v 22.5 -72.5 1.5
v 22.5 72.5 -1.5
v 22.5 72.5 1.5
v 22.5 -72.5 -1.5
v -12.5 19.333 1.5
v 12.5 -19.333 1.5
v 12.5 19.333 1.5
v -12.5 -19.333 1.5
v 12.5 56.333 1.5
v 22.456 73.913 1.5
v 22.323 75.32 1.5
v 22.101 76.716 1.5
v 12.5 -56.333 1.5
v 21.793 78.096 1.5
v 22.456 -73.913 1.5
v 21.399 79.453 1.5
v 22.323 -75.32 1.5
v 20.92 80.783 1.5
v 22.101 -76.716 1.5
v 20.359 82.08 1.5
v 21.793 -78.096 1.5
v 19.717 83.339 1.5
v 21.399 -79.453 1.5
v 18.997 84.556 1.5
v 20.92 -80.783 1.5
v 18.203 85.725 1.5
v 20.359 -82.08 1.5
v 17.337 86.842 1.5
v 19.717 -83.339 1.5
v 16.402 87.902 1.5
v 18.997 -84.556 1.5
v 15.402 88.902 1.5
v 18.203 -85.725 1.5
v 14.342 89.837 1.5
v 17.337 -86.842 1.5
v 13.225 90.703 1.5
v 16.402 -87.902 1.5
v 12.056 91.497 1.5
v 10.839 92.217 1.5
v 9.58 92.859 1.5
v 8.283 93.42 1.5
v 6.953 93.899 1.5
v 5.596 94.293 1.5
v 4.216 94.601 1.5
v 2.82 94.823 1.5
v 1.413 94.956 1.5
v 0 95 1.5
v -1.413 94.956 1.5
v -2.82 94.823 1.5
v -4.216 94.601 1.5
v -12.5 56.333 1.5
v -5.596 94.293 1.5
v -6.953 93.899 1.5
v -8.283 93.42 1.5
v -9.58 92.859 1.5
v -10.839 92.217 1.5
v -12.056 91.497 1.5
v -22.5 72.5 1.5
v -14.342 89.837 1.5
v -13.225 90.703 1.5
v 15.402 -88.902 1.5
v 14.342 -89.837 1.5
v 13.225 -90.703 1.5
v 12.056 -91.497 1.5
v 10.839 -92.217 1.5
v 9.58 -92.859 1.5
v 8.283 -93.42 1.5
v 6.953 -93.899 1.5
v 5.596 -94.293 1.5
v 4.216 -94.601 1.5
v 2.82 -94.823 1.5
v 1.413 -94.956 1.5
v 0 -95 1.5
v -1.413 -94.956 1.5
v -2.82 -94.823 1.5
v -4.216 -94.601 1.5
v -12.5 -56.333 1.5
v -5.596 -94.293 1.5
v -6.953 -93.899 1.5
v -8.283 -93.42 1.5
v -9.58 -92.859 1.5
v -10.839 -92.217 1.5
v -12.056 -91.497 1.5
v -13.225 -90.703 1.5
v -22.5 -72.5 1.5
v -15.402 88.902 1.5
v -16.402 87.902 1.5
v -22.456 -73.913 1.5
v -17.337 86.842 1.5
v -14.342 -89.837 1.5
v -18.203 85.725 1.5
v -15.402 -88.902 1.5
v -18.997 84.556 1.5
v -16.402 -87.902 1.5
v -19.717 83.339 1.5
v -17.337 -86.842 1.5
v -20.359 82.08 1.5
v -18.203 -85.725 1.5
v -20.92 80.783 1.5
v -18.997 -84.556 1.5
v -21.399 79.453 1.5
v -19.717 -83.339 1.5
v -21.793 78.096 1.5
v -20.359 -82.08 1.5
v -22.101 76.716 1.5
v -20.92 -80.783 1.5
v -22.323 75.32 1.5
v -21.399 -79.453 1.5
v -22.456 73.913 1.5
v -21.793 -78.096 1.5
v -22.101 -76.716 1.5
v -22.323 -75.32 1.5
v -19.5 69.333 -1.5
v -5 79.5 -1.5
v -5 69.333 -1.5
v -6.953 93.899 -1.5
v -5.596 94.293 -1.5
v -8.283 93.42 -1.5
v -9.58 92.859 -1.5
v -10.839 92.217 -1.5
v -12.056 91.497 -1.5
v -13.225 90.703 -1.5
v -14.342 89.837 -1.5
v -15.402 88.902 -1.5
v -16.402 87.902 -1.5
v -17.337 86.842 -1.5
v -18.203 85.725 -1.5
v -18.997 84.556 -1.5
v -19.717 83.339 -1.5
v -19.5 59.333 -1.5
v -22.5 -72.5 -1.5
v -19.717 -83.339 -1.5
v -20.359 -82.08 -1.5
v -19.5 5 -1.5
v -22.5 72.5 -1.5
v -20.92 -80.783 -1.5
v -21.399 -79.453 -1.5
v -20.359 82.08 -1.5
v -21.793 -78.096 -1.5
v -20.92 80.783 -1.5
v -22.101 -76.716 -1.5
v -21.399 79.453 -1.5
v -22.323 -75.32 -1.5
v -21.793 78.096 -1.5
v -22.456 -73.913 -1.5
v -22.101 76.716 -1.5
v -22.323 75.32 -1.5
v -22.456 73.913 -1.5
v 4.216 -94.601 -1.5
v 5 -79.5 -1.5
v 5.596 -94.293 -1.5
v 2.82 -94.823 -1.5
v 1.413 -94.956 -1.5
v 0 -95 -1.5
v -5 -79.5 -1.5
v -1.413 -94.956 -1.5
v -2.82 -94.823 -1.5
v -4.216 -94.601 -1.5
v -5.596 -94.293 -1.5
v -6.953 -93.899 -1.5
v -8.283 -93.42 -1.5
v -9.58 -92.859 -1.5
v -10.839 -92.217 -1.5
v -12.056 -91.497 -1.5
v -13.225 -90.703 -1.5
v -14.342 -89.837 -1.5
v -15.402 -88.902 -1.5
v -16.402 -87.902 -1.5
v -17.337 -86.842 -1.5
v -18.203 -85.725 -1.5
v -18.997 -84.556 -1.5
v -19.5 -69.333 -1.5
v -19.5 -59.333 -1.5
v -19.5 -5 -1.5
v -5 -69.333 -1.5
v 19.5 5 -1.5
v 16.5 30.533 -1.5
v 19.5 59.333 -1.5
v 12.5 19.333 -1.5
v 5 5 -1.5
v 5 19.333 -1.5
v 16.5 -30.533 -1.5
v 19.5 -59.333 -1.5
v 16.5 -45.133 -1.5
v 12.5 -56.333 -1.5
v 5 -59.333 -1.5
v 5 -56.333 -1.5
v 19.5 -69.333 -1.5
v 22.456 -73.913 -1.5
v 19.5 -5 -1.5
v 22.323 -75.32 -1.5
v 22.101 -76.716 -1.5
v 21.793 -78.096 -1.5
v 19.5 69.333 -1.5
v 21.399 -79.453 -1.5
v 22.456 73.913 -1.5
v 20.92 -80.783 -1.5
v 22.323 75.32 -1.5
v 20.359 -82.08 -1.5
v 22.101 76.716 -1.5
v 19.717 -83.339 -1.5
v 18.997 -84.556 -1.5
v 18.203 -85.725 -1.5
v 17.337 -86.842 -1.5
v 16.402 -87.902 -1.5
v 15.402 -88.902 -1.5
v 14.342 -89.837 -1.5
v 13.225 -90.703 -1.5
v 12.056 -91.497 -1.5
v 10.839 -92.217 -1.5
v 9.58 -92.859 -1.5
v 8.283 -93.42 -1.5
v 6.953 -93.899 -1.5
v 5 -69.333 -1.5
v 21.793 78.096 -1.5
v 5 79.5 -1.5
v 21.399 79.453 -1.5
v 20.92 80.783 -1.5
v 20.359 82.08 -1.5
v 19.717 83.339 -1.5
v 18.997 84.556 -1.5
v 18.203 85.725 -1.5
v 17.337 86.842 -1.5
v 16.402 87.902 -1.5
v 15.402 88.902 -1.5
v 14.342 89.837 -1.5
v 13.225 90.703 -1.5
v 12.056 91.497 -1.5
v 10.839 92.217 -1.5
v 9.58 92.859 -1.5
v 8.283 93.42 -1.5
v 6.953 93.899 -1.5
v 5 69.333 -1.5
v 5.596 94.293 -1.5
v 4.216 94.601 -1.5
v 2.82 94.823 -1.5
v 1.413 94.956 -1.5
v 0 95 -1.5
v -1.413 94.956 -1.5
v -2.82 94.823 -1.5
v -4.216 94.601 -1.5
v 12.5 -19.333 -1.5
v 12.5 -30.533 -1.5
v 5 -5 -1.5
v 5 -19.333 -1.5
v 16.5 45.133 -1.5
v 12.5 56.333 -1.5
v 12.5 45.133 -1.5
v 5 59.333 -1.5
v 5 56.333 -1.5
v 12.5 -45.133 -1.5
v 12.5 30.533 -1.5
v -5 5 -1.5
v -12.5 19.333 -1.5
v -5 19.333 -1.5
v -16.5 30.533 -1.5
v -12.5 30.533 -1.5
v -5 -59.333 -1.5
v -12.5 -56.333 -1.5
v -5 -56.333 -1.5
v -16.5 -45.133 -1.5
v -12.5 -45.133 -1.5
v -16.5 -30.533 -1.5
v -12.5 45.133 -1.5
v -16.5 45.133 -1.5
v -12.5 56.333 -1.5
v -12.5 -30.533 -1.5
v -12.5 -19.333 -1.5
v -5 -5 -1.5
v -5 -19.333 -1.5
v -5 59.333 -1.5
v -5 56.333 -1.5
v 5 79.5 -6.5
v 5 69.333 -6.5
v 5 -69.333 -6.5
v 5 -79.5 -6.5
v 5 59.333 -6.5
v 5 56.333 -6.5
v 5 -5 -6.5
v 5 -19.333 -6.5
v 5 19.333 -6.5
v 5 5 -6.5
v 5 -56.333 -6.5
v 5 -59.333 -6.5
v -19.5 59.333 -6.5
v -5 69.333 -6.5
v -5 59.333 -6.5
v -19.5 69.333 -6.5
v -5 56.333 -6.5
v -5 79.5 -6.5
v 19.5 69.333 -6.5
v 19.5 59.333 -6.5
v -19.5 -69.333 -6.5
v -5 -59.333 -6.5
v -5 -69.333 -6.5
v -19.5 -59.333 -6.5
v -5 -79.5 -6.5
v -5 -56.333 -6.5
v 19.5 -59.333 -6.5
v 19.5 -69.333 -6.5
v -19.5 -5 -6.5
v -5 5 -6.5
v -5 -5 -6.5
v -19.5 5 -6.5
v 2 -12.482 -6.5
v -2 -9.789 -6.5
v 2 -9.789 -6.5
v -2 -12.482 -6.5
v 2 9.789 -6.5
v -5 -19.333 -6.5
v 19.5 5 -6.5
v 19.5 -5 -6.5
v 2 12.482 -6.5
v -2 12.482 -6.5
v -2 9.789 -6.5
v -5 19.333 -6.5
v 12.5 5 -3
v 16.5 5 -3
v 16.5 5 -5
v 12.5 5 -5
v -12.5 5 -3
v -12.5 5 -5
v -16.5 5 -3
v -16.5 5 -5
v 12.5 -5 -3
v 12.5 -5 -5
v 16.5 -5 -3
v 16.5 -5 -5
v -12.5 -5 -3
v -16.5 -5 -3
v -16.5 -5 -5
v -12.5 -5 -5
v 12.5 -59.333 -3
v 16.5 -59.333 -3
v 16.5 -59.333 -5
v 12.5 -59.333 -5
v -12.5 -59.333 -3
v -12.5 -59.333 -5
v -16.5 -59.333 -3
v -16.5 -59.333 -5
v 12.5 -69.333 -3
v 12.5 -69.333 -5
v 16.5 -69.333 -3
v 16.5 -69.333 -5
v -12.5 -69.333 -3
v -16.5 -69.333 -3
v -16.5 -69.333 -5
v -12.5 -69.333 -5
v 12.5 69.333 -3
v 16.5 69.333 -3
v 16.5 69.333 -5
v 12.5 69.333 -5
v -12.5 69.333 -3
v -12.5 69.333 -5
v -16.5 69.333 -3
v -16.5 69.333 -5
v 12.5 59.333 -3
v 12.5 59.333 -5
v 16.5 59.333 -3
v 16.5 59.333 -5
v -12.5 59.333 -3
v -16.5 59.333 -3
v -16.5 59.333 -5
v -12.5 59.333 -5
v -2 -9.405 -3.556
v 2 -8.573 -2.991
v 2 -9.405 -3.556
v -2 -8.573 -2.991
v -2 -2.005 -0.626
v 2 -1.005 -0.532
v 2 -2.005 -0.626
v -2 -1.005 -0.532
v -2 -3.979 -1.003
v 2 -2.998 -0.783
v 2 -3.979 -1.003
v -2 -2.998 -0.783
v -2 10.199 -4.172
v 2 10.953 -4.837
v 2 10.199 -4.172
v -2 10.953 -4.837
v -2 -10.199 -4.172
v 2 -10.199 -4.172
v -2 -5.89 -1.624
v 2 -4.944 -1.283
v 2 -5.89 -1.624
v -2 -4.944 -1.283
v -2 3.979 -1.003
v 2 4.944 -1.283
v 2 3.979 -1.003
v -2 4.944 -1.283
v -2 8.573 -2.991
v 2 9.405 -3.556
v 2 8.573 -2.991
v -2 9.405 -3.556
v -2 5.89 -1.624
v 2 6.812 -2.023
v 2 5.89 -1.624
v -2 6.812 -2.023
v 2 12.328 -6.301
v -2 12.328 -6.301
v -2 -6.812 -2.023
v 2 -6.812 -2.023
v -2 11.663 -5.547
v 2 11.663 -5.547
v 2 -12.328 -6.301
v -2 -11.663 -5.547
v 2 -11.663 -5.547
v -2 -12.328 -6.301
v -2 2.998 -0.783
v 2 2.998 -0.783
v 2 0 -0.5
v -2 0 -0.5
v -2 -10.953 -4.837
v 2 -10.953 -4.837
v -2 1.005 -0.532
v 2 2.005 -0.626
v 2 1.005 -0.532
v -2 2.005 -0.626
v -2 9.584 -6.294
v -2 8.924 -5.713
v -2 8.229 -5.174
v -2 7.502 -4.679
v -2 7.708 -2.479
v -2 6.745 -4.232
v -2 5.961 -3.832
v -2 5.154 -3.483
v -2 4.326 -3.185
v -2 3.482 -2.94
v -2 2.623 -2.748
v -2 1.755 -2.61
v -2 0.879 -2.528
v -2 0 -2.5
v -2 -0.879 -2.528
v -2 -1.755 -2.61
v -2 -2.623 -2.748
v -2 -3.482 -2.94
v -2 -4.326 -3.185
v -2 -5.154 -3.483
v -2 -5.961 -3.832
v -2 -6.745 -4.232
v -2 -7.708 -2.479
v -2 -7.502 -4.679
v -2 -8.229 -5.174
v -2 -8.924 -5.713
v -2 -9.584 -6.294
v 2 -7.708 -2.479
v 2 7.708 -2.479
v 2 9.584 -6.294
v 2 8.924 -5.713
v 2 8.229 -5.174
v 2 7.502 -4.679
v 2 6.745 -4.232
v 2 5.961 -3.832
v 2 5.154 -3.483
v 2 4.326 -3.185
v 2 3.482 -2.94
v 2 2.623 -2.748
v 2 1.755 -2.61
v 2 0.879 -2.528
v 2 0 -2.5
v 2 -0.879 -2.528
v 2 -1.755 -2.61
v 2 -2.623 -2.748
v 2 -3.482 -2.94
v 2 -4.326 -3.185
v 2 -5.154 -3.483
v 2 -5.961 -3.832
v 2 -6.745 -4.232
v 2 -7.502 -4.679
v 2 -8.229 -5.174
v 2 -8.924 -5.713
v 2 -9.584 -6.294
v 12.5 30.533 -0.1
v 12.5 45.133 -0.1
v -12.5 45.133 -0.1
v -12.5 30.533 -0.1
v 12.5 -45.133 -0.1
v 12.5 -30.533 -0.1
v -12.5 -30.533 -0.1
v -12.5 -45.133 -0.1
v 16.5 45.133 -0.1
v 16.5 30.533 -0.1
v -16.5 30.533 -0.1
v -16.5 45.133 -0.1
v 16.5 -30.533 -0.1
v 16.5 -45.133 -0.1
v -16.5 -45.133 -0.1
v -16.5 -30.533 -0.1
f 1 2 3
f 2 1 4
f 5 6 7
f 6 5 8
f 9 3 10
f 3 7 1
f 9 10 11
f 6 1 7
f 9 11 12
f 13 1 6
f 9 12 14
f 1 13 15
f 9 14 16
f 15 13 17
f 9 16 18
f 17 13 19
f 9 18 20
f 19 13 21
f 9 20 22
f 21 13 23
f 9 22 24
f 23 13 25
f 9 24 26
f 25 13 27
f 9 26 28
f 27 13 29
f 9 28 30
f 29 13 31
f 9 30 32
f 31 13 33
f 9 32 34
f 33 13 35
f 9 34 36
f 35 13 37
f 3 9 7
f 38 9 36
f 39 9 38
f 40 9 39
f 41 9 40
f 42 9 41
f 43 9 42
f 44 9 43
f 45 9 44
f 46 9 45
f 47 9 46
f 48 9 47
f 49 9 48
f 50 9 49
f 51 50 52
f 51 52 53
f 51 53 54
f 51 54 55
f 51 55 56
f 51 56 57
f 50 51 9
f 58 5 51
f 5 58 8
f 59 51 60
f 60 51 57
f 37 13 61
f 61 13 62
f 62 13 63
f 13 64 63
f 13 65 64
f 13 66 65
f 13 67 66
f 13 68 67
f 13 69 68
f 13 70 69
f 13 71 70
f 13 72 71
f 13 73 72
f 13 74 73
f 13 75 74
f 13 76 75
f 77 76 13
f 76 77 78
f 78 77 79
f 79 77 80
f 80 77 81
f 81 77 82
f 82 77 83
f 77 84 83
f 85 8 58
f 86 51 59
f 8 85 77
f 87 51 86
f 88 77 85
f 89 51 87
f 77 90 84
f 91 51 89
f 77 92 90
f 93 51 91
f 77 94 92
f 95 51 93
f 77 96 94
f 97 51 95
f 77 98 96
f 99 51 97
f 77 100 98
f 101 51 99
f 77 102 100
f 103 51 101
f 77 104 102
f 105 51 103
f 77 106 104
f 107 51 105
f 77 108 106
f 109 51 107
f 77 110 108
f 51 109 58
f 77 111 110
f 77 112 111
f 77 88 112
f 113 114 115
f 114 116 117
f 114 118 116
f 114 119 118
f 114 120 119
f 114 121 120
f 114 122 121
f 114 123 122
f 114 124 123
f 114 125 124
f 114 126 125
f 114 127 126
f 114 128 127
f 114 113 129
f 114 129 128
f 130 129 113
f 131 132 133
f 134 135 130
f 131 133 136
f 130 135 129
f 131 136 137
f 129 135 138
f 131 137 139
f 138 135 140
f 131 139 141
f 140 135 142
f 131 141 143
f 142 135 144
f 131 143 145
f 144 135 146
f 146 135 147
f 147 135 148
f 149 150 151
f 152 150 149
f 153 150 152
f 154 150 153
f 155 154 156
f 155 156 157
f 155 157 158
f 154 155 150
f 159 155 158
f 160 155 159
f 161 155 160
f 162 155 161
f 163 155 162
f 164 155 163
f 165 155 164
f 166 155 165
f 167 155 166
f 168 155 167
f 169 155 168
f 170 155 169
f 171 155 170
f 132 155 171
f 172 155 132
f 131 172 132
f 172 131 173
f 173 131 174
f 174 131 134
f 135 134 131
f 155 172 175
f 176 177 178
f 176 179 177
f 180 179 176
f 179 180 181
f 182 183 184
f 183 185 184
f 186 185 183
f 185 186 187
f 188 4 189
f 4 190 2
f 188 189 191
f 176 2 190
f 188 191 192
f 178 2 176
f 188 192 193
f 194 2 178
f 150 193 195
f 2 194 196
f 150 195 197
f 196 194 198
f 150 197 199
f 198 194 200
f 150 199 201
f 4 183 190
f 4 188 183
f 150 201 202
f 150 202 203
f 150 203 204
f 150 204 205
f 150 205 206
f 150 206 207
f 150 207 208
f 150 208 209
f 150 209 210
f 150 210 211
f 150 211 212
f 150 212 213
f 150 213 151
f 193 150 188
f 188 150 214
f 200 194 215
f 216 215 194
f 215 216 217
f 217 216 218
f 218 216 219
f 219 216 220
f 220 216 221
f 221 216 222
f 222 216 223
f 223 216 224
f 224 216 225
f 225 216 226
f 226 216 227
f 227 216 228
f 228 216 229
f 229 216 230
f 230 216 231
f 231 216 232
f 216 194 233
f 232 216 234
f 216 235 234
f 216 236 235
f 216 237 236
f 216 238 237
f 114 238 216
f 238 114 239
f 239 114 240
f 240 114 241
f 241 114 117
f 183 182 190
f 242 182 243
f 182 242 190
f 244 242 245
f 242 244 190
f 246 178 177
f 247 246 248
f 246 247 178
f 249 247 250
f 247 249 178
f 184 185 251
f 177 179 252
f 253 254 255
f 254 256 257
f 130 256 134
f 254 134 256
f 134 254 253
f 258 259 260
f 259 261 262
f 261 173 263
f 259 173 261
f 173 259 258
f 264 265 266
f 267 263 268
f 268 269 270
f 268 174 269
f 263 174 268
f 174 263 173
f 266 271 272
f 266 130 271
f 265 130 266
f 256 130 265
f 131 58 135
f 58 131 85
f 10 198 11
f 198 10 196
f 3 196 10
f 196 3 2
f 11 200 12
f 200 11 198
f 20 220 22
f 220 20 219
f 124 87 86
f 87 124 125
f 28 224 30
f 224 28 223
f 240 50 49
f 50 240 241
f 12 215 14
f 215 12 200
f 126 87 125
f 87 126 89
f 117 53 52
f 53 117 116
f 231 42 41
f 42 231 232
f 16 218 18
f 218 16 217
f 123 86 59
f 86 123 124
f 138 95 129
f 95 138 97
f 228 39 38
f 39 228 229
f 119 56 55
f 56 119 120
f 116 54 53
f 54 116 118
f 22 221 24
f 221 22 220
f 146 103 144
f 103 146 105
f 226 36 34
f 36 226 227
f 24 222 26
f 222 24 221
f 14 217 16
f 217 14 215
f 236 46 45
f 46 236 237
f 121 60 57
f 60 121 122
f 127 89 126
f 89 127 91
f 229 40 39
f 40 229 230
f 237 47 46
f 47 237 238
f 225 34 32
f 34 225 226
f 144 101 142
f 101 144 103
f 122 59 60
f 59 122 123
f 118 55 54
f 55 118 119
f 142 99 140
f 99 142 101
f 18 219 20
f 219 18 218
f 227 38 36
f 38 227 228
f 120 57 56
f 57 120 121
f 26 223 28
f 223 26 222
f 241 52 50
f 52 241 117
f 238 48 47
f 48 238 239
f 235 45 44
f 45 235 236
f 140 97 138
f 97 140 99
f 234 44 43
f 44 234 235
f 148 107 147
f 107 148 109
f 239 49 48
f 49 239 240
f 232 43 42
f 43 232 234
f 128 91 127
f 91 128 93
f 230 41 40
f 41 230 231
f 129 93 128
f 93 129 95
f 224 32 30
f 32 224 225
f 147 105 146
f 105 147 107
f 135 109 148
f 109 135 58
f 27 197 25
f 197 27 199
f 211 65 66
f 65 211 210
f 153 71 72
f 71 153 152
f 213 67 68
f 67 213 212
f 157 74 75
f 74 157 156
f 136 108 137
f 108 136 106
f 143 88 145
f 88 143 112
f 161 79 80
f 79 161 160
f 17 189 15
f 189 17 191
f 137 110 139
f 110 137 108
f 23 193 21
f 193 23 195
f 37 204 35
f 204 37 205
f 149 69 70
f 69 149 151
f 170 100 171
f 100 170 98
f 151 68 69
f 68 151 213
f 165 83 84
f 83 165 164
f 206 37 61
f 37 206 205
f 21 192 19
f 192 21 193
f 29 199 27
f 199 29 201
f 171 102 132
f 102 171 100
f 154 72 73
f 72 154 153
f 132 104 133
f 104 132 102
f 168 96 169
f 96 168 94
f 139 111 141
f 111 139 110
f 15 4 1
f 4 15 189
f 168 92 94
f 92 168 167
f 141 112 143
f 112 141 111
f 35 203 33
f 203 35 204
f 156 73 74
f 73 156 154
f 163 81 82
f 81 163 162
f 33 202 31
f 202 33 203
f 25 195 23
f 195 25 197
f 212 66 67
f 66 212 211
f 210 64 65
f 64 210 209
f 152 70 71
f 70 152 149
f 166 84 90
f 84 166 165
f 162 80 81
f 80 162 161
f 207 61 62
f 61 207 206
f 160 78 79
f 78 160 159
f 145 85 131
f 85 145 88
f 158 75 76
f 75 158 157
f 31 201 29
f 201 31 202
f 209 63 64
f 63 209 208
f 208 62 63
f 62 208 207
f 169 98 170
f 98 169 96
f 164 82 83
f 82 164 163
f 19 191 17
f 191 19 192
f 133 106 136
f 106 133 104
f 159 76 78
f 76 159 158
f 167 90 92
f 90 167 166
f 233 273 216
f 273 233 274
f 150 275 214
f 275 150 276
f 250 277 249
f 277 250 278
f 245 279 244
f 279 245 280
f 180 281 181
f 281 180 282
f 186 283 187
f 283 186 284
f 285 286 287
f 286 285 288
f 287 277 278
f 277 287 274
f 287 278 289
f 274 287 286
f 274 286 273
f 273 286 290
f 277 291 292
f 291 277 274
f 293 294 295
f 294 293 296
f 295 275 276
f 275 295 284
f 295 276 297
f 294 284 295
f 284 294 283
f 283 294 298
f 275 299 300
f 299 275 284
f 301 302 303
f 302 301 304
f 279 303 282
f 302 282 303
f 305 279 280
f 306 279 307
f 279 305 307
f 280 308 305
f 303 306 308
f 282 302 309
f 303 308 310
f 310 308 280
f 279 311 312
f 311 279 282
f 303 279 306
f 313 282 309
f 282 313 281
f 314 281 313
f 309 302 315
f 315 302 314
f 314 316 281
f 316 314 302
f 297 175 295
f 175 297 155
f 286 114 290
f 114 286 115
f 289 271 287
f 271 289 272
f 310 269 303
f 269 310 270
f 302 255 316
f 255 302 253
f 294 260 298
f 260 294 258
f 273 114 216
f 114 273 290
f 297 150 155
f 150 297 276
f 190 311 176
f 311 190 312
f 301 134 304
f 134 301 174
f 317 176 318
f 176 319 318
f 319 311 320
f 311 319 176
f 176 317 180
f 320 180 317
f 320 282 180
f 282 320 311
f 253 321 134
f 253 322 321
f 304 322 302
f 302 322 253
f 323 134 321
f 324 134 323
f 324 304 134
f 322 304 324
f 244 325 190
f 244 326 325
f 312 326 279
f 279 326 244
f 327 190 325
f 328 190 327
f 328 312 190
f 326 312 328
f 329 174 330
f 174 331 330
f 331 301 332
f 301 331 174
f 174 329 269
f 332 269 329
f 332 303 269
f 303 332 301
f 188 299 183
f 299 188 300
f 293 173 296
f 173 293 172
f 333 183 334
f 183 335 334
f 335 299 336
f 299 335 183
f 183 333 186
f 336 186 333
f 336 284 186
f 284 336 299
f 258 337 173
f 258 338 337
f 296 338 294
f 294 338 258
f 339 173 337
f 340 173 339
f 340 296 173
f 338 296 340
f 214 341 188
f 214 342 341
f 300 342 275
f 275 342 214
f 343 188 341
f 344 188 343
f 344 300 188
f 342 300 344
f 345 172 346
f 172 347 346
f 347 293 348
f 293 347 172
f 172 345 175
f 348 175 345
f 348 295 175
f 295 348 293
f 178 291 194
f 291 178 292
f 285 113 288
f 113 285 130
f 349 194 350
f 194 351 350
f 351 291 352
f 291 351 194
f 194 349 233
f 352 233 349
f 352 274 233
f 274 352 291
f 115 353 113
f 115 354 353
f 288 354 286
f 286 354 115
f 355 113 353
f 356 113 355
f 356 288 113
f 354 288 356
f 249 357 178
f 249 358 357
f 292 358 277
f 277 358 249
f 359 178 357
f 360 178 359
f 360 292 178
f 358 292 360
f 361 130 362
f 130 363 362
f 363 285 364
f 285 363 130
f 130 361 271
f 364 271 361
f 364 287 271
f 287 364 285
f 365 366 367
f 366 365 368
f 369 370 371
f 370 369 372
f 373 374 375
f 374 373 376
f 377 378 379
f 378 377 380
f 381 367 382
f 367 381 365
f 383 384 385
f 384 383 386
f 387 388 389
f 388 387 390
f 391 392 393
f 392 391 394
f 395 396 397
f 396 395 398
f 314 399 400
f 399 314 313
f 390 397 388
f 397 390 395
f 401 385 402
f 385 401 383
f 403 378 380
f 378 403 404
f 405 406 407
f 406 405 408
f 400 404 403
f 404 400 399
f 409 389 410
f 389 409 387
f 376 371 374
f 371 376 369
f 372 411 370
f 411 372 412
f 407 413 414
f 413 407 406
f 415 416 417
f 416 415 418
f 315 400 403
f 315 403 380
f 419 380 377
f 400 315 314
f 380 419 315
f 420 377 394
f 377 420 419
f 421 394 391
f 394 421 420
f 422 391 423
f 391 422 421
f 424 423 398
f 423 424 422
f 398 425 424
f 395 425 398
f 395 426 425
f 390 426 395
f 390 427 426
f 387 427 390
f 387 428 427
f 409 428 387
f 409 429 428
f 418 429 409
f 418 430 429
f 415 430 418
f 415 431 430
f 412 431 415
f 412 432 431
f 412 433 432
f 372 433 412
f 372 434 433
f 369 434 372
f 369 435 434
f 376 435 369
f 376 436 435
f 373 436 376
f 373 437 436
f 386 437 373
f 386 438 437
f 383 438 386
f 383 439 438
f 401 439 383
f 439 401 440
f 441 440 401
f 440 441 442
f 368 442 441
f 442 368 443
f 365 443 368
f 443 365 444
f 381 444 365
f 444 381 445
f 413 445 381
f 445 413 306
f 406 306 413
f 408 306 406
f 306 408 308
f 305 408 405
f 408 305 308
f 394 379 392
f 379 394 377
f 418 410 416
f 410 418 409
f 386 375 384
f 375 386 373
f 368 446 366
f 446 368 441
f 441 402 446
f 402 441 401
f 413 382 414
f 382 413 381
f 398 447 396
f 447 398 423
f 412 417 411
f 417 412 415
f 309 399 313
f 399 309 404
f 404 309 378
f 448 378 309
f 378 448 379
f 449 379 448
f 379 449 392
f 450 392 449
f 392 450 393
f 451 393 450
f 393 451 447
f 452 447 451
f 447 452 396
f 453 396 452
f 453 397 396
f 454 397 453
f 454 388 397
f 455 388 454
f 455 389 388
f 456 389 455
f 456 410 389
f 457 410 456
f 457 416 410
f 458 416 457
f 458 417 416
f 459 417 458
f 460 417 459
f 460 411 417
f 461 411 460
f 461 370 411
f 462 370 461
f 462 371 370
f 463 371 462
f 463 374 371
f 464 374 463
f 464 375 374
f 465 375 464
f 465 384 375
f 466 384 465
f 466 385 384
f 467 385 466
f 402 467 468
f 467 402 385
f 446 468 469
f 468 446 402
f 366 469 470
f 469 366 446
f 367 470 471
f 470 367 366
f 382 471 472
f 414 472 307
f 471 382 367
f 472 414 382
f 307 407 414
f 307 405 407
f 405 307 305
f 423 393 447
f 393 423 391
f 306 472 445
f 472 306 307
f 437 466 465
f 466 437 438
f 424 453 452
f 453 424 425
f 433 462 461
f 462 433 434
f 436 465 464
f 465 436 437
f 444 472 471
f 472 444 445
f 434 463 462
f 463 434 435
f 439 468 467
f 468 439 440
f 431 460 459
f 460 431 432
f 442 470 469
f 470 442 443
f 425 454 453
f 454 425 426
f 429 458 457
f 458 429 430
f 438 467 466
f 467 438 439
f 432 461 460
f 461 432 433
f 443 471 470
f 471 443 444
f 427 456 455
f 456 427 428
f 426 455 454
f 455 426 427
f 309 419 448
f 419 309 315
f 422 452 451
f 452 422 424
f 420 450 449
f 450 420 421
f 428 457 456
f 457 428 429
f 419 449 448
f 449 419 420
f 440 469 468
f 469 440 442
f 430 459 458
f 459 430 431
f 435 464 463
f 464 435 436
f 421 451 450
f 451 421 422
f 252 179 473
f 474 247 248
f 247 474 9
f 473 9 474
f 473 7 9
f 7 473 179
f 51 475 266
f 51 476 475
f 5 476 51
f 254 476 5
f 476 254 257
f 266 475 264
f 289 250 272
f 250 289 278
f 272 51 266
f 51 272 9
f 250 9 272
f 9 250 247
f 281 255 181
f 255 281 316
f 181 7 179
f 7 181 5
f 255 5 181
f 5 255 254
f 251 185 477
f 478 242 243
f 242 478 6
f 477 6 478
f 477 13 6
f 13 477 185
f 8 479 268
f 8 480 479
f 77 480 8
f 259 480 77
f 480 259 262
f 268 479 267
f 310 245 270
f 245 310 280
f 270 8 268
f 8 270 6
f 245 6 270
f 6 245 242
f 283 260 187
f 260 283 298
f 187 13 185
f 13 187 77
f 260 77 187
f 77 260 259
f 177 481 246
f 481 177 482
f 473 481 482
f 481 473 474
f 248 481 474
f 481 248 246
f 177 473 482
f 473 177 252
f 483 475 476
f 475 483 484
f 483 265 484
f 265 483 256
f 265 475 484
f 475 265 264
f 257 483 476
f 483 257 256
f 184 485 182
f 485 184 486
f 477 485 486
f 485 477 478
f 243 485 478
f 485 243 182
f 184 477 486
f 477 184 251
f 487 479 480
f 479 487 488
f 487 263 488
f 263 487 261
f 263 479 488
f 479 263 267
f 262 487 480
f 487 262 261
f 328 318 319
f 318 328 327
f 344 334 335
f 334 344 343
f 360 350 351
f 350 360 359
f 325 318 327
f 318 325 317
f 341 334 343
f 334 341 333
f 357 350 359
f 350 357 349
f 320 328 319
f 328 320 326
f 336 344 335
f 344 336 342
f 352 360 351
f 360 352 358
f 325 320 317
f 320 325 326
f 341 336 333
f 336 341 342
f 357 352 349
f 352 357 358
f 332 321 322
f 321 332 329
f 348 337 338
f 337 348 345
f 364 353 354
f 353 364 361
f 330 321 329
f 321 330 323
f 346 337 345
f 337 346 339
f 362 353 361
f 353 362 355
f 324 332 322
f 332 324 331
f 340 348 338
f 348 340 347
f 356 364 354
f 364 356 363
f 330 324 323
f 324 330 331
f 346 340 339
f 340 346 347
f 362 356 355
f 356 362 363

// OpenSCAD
l_vao = 39;

a_topo = 3;
c_topo = 190;
l_topo = l_vao + 6;;

a_chanfro = 1.6;
c_chanfro = 13.6 + 1; // Comprimento mais tolerância
l_chanfro = 3.0 + 1 + 1; // Largura mais tolerância, mas espeço extra para diferença funcionar.

c_tomada = 37;
l_tomada = 25;

d_tomadas = ( c_topo - 2 * c_tomada ) / 3;

a_reforco = 6.0;
l_reforco = 10.0;
c_reforco = 159;
d_reforco = 3;

fn = 100;

l_amarra = 4;
a_amarra = 2;
r_amarra = 15;

module ring( ir, or, l ){    
    rotate( 90, [ 0, 1, 0 ] )
        translate( [ 0, 0, -l / 2 ] )
            difference(){
                cylinder( h = l, r = or, $fn = fn );
                translate( [ 0, 0, -1 ] )
                    cylinder( h = l + 2, r = ir, $fn = fn );
            }    
}

difference(){
    
    union(){
        // tampo
        cube( [ l_topo, c_topo - l_topo, a_topo ], center = true );
        translate( [ 0, ( c_topo - l_topo ) / 2, -a_topo / 2 ] )
            cylinder( h = a_topo, d = l_topo, $fn = fn );
        translate( [ 0, -( c_topo - l_topo ) / 2, -a_topo / 2 ] )
            cylinder( h = a_topo, d = l_topo, $fn = fn );
        // Reforços
        translate( [ 0, 0, -( a_topo + a_reforco ) / 2 + 1 ] )
            cube( [ l_reforco, c_reforco, a_reforco ], center = true );
        translate( [ 0, 0, -( a_topo + a_reforco ) / 2 + 1 ] )
            cube( [ l_vao, l_reforco, a_reforco ], center = true );
        translate( [ 0, -( d_tomadas / 2 + c_tomada + l_reforco / 2 + d_reforco ), -( a_topo + a_reforco ) / 2 + 1 ] )
            cube( [ l_vao, l_reforco, a_reforco ], center = true );
        translate( [ 0, ( d_tomadas / 2 + c_tomada + l_reforco / 2  + d_reforco ), -( a_topo + a_reforco ) / 2 + 1 ] )
            cube( [ l_vao, l_reforco, a_reforco ], center = true );
    }
    
    // Tomadas    
    translate( [ 0, ( c_tomada + d_tomadas ) / 2, 0 ] )
        cube( [ l_tomada, c_tomada, a_topo + 2 * a_reforco + 1 ], center = true );
    translate( [ 0, -( c_tomada + d_tomadas ) / 2, 0 ] )
        cube( [ l_tomada, c_tomada, a_topo + 2 * a_reforco + 1 ], center = true );
    
    // Chanfros
    translate( [ ( l_chanfro + l_tomada ) / 2 - 1, ( c_tomada + d_tomadas ) / 2, -a_chanfro ] )
        cube( [ l_chanfro, c_chanfro, a_topo ], center = true );
    translate( [ 1 - ( l_chanfro + l_tomada ) / 2, ( c_tomada + d_tomadas ) / 2, -a_chanfro ] )
        cube( [ l_chanfro, c_chanfro, a_topo ], center = true );
    translate( [ ( l_chanfro + l_tomada ) / 2 - 1, -( c_tomada + d_tomadas ) / 2, -a_chanfro ] )
        cube( [ l_chanfro, c_chanfro, a_topo ], center = true );
    translate( [ 1 - ( l_chanfro + l_tomada ) / 2, -( c_tomada + d_tomadas ) / 2, -a_chanfro ] )
        cube( [ l_chanfro, c_chanfro, a_topo ], center = true );    

    // Amarras
    translate( [ 0, 0, -( r_amarra + a_topo / 2 )] )
        ring( r_amarra - a_amarra / 2, r_amarra + a_amarra / 2, l_amarra );
    translate( [ l_amarra / 2 + l_tomada / 2, 0, -( a_topo / 2 + a_reforco / 2 - 0.5 )] )
        cube( [ l_amarra, c_topo, a_amarra ], center = true );
    translate( [ -( l_amarra / 2 + l_tomada / 2 ), 0, -( a_topo / 2 + a_reforco / 2 - 0.5 )] )
        cube( [ l_amarra, c_topo, a_amarra ], center = true );
}
